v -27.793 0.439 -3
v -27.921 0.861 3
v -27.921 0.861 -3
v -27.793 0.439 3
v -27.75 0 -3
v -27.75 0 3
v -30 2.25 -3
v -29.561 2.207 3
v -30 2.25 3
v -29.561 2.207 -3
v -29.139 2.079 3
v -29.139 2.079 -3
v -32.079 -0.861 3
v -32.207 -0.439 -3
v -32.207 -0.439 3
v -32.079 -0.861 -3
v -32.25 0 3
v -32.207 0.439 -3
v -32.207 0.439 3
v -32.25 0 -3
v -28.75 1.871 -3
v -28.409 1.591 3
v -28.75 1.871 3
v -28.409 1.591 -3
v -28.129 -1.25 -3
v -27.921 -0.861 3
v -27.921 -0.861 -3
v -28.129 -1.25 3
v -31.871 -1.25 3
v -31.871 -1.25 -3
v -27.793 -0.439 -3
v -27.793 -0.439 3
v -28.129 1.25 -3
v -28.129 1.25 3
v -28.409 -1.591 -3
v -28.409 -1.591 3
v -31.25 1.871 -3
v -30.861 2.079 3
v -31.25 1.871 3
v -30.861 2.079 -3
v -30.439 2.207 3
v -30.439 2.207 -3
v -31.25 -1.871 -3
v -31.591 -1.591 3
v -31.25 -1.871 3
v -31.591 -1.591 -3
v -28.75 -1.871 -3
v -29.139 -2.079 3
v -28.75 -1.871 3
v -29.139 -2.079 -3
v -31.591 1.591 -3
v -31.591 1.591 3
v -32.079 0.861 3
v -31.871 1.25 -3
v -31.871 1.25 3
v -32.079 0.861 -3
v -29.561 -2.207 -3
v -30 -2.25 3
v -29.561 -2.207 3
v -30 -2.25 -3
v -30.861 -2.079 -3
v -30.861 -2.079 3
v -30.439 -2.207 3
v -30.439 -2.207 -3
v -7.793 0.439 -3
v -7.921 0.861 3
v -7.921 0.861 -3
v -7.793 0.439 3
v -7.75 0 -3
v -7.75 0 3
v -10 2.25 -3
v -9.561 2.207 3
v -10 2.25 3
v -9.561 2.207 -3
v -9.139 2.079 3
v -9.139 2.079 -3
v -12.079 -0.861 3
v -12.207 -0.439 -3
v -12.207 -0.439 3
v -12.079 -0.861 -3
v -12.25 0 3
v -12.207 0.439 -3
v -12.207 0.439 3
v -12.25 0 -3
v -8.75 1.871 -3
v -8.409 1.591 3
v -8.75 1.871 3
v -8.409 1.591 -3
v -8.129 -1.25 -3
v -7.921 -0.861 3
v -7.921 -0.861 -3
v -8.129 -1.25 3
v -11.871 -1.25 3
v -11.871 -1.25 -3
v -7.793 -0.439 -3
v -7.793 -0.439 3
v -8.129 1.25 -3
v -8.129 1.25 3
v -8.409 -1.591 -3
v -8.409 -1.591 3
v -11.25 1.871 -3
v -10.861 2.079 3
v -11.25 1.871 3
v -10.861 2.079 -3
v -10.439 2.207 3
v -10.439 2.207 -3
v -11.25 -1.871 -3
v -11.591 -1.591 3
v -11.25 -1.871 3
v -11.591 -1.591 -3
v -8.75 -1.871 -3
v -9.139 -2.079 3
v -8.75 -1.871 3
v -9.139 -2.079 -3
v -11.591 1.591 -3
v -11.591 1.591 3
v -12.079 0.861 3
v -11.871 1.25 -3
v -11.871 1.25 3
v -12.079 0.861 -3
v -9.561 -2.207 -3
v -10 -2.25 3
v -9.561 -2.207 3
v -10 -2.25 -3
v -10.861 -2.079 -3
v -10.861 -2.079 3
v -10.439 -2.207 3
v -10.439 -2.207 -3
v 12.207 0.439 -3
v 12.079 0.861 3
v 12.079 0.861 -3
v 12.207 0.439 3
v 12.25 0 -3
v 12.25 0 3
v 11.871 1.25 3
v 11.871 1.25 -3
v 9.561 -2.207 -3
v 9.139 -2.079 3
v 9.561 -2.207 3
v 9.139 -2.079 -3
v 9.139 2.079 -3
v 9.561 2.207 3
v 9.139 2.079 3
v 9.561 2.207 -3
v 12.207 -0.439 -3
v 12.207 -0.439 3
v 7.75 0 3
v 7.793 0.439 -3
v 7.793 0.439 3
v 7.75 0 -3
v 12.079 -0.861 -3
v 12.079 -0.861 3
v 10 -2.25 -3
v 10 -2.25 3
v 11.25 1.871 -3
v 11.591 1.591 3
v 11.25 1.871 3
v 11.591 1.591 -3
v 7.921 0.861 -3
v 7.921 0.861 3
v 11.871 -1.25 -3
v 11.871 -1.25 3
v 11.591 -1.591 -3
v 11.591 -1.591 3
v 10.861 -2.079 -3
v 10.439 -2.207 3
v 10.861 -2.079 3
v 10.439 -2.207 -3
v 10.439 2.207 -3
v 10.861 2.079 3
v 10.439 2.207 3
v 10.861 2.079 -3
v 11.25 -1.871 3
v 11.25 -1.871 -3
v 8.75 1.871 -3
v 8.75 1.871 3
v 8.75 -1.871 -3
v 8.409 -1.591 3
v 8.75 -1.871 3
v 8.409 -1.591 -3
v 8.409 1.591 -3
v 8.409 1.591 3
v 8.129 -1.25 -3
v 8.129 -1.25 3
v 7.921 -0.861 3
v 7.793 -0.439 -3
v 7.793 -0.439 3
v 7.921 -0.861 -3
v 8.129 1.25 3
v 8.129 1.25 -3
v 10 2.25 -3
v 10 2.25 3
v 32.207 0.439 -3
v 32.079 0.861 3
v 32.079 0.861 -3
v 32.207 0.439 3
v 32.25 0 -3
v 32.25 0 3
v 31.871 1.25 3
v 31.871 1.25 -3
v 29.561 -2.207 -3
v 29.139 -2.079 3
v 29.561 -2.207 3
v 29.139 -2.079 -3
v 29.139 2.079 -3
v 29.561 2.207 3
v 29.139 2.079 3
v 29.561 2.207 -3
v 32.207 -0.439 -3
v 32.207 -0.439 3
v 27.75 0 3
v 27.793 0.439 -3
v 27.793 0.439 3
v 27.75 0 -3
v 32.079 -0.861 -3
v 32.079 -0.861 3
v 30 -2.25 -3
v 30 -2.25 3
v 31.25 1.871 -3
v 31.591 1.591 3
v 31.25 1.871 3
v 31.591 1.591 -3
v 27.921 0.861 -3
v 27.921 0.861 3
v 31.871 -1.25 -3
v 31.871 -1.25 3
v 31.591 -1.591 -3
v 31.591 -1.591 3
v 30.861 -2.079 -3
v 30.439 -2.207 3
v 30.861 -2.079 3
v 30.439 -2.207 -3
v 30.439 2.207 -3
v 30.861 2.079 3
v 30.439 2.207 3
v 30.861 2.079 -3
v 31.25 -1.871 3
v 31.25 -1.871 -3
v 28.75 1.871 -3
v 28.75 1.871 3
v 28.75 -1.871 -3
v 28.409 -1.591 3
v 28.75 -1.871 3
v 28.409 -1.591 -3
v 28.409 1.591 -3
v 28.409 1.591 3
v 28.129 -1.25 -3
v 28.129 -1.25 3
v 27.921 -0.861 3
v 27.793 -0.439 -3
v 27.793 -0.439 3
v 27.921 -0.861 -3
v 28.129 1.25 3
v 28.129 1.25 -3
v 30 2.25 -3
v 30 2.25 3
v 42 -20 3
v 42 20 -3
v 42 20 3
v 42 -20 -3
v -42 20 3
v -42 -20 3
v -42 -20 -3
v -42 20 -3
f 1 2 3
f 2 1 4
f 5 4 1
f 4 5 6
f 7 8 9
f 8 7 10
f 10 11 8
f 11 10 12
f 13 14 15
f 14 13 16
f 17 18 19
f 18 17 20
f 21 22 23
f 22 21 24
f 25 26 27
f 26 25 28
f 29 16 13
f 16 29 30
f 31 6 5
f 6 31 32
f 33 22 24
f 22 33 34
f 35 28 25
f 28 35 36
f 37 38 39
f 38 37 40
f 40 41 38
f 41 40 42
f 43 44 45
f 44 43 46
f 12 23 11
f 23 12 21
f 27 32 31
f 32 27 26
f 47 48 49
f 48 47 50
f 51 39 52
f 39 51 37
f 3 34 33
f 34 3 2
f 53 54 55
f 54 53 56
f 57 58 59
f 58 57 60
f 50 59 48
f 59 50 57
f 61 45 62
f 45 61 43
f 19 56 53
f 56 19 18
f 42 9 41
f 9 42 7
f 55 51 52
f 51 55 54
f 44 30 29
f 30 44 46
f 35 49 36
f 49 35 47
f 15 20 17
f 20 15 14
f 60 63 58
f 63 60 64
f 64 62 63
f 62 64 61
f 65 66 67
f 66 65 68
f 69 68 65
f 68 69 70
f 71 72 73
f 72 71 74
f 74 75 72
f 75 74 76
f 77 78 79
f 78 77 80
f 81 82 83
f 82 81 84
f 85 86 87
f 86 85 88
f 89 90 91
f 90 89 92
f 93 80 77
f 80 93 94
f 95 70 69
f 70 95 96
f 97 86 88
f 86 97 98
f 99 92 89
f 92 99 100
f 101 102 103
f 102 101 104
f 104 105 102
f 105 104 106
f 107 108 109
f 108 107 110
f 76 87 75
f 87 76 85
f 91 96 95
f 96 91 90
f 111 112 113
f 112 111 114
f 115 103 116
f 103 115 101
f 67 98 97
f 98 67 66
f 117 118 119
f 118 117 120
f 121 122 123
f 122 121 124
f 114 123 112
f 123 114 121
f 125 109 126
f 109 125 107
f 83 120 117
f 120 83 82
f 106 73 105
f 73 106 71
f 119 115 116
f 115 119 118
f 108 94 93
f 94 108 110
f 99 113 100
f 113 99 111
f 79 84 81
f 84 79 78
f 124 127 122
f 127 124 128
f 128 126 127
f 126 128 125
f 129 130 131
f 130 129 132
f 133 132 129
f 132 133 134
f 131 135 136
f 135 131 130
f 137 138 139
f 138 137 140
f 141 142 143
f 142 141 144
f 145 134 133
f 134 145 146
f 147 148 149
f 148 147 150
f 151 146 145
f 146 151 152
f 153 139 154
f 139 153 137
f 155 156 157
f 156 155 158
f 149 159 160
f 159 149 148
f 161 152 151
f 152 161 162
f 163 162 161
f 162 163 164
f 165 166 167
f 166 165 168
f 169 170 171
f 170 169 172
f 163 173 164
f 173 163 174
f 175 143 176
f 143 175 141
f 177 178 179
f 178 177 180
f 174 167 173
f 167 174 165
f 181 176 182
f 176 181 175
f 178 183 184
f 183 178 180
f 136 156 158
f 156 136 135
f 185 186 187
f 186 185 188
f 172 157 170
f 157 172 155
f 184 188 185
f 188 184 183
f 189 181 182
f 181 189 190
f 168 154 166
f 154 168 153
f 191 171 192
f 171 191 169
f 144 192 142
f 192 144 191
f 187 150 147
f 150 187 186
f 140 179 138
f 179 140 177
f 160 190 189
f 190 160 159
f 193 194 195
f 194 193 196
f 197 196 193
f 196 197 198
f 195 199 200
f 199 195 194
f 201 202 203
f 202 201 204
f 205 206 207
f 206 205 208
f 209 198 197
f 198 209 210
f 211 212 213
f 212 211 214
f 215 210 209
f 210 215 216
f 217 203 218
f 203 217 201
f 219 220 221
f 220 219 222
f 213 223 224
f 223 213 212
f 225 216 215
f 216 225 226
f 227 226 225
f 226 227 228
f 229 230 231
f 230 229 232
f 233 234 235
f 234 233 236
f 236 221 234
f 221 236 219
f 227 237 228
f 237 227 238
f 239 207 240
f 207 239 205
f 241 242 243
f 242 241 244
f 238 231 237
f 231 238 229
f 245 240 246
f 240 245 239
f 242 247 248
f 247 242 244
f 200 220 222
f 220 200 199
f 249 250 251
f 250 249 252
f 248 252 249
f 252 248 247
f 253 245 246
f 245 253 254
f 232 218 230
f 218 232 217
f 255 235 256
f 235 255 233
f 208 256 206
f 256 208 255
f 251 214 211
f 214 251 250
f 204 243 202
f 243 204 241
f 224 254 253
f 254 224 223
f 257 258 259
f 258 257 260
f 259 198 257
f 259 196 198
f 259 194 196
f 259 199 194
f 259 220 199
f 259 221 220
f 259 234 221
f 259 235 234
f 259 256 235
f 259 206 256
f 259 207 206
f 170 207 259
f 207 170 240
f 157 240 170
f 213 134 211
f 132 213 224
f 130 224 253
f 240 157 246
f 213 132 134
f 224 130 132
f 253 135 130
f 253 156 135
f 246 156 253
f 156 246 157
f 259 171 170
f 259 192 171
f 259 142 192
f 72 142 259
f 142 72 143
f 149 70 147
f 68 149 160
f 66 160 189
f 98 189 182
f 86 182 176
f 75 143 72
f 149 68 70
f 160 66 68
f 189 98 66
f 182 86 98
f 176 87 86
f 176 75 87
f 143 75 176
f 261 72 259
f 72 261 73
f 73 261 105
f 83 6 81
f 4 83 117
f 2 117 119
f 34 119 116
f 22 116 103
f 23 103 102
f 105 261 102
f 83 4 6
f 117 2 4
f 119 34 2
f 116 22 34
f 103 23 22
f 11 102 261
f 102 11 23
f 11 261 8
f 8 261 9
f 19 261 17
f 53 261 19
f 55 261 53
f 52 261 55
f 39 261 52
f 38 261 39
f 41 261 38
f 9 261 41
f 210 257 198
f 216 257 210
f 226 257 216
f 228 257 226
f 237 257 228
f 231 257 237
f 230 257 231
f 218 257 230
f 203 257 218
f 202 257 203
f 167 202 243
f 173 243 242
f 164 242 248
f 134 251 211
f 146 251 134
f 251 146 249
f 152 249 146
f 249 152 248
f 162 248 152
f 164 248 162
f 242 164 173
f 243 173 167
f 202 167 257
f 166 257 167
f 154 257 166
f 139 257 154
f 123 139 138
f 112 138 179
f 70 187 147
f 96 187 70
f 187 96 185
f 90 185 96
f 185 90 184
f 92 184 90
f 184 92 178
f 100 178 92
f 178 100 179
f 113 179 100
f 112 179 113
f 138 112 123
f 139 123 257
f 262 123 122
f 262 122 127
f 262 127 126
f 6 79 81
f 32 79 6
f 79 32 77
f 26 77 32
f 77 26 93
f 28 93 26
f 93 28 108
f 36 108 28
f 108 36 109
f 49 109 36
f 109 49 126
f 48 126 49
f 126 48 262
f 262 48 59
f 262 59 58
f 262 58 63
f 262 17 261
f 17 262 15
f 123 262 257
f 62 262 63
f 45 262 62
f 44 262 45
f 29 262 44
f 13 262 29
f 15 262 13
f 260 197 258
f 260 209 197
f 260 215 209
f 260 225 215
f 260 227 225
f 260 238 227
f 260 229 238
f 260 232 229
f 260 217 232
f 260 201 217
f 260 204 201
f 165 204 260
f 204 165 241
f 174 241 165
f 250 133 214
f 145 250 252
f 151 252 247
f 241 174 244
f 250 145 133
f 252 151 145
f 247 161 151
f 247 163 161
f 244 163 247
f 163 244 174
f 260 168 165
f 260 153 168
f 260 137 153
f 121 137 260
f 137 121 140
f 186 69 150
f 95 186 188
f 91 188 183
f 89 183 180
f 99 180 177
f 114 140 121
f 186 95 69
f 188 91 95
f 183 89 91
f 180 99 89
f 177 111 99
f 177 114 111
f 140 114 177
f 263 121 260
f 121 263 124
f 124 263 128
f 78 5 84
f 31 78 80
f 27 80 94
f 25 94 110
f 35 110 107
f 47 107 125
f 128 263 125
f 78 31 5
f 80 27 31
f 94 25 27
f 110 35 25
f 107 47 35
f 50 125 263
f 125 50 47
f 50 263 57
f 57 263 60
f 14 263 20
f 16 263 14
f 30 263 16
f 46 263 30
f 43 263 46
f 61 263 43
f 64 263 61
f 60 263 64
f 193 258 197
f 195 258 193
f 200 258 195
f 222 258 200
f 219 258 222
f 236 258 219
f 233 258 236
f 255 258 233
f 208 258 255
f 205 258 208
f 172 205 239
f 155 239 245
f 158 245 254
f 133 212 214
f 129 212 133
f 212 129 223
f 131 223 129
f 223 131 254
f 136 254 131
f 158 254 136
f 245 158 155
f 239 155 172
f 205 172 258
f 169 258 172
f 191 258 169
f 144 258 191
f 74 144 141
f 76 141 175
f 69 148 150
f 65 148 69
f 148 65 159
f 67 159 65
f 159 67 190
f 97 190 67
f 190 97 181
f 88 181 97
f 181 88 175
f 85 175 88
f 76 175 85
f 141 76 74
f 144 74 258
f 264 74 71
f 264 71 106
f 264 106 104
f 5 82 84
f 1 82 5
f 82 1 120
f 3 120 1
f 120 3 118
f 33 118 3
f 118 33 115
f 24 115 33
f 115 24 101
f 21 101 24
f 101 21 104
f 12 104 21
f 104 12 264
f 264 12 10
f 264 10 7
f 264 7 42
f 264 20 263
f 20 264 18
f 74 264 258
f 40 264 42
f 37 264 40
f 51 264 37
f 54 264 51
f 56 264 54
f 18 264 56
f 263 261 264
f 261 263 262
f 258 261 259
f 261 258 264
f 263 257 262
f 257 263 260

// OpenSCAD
$fn = 32;

// ----------------------------------------------------------------------
// Hole bar, 4 x Ø4.5
// skip layout, 12 mm edge offset
// ----------------------------------------------------------------------

// --- parameters (mm) ---
bar_w = 40;       // bar width (Y)
bar_t = 6;        // bar thickness (Z)
holes = 4;        // holes per row
hole_d = 4.5;     // hole diameter
edge = 12;        // offset from the bar end to the first hole
grid_pitch = 10;  // grid the bar was laid out on

// --- derived feature positions (mm) ---
pitch = grid_pitch * 2;       // = 20   holes sit every other grid slot
span = (holes - 1) * pitch;   // = 60   distance between the end holes
bar_l = span + 2 * edge;      // = 84   overall bar length
start_x = -bar_l / 2 + edge;  // = -30   X of the first hole
feature_centers = [
  [start_x + 0 * pitch, 0],
  [start_x + 1 * pitch, 0],
  [start_x + 2 * pitch, 0],
  [start_x + 3 * pitch, 0]
];   // hole centres of the first row

// bar with one row of holes, drilled from feature_centers
difference() {
  translate([-bar_l / 2, -bar_w / 2, -bar_t / 2]) cube([bar_l, bar_w, bar_t]);
  for (centre = feature_centers)
    translate([centre[0], centre[1], 0])
      cylinder(d = hole_d, h = bar_t + 2, center = true);
}
